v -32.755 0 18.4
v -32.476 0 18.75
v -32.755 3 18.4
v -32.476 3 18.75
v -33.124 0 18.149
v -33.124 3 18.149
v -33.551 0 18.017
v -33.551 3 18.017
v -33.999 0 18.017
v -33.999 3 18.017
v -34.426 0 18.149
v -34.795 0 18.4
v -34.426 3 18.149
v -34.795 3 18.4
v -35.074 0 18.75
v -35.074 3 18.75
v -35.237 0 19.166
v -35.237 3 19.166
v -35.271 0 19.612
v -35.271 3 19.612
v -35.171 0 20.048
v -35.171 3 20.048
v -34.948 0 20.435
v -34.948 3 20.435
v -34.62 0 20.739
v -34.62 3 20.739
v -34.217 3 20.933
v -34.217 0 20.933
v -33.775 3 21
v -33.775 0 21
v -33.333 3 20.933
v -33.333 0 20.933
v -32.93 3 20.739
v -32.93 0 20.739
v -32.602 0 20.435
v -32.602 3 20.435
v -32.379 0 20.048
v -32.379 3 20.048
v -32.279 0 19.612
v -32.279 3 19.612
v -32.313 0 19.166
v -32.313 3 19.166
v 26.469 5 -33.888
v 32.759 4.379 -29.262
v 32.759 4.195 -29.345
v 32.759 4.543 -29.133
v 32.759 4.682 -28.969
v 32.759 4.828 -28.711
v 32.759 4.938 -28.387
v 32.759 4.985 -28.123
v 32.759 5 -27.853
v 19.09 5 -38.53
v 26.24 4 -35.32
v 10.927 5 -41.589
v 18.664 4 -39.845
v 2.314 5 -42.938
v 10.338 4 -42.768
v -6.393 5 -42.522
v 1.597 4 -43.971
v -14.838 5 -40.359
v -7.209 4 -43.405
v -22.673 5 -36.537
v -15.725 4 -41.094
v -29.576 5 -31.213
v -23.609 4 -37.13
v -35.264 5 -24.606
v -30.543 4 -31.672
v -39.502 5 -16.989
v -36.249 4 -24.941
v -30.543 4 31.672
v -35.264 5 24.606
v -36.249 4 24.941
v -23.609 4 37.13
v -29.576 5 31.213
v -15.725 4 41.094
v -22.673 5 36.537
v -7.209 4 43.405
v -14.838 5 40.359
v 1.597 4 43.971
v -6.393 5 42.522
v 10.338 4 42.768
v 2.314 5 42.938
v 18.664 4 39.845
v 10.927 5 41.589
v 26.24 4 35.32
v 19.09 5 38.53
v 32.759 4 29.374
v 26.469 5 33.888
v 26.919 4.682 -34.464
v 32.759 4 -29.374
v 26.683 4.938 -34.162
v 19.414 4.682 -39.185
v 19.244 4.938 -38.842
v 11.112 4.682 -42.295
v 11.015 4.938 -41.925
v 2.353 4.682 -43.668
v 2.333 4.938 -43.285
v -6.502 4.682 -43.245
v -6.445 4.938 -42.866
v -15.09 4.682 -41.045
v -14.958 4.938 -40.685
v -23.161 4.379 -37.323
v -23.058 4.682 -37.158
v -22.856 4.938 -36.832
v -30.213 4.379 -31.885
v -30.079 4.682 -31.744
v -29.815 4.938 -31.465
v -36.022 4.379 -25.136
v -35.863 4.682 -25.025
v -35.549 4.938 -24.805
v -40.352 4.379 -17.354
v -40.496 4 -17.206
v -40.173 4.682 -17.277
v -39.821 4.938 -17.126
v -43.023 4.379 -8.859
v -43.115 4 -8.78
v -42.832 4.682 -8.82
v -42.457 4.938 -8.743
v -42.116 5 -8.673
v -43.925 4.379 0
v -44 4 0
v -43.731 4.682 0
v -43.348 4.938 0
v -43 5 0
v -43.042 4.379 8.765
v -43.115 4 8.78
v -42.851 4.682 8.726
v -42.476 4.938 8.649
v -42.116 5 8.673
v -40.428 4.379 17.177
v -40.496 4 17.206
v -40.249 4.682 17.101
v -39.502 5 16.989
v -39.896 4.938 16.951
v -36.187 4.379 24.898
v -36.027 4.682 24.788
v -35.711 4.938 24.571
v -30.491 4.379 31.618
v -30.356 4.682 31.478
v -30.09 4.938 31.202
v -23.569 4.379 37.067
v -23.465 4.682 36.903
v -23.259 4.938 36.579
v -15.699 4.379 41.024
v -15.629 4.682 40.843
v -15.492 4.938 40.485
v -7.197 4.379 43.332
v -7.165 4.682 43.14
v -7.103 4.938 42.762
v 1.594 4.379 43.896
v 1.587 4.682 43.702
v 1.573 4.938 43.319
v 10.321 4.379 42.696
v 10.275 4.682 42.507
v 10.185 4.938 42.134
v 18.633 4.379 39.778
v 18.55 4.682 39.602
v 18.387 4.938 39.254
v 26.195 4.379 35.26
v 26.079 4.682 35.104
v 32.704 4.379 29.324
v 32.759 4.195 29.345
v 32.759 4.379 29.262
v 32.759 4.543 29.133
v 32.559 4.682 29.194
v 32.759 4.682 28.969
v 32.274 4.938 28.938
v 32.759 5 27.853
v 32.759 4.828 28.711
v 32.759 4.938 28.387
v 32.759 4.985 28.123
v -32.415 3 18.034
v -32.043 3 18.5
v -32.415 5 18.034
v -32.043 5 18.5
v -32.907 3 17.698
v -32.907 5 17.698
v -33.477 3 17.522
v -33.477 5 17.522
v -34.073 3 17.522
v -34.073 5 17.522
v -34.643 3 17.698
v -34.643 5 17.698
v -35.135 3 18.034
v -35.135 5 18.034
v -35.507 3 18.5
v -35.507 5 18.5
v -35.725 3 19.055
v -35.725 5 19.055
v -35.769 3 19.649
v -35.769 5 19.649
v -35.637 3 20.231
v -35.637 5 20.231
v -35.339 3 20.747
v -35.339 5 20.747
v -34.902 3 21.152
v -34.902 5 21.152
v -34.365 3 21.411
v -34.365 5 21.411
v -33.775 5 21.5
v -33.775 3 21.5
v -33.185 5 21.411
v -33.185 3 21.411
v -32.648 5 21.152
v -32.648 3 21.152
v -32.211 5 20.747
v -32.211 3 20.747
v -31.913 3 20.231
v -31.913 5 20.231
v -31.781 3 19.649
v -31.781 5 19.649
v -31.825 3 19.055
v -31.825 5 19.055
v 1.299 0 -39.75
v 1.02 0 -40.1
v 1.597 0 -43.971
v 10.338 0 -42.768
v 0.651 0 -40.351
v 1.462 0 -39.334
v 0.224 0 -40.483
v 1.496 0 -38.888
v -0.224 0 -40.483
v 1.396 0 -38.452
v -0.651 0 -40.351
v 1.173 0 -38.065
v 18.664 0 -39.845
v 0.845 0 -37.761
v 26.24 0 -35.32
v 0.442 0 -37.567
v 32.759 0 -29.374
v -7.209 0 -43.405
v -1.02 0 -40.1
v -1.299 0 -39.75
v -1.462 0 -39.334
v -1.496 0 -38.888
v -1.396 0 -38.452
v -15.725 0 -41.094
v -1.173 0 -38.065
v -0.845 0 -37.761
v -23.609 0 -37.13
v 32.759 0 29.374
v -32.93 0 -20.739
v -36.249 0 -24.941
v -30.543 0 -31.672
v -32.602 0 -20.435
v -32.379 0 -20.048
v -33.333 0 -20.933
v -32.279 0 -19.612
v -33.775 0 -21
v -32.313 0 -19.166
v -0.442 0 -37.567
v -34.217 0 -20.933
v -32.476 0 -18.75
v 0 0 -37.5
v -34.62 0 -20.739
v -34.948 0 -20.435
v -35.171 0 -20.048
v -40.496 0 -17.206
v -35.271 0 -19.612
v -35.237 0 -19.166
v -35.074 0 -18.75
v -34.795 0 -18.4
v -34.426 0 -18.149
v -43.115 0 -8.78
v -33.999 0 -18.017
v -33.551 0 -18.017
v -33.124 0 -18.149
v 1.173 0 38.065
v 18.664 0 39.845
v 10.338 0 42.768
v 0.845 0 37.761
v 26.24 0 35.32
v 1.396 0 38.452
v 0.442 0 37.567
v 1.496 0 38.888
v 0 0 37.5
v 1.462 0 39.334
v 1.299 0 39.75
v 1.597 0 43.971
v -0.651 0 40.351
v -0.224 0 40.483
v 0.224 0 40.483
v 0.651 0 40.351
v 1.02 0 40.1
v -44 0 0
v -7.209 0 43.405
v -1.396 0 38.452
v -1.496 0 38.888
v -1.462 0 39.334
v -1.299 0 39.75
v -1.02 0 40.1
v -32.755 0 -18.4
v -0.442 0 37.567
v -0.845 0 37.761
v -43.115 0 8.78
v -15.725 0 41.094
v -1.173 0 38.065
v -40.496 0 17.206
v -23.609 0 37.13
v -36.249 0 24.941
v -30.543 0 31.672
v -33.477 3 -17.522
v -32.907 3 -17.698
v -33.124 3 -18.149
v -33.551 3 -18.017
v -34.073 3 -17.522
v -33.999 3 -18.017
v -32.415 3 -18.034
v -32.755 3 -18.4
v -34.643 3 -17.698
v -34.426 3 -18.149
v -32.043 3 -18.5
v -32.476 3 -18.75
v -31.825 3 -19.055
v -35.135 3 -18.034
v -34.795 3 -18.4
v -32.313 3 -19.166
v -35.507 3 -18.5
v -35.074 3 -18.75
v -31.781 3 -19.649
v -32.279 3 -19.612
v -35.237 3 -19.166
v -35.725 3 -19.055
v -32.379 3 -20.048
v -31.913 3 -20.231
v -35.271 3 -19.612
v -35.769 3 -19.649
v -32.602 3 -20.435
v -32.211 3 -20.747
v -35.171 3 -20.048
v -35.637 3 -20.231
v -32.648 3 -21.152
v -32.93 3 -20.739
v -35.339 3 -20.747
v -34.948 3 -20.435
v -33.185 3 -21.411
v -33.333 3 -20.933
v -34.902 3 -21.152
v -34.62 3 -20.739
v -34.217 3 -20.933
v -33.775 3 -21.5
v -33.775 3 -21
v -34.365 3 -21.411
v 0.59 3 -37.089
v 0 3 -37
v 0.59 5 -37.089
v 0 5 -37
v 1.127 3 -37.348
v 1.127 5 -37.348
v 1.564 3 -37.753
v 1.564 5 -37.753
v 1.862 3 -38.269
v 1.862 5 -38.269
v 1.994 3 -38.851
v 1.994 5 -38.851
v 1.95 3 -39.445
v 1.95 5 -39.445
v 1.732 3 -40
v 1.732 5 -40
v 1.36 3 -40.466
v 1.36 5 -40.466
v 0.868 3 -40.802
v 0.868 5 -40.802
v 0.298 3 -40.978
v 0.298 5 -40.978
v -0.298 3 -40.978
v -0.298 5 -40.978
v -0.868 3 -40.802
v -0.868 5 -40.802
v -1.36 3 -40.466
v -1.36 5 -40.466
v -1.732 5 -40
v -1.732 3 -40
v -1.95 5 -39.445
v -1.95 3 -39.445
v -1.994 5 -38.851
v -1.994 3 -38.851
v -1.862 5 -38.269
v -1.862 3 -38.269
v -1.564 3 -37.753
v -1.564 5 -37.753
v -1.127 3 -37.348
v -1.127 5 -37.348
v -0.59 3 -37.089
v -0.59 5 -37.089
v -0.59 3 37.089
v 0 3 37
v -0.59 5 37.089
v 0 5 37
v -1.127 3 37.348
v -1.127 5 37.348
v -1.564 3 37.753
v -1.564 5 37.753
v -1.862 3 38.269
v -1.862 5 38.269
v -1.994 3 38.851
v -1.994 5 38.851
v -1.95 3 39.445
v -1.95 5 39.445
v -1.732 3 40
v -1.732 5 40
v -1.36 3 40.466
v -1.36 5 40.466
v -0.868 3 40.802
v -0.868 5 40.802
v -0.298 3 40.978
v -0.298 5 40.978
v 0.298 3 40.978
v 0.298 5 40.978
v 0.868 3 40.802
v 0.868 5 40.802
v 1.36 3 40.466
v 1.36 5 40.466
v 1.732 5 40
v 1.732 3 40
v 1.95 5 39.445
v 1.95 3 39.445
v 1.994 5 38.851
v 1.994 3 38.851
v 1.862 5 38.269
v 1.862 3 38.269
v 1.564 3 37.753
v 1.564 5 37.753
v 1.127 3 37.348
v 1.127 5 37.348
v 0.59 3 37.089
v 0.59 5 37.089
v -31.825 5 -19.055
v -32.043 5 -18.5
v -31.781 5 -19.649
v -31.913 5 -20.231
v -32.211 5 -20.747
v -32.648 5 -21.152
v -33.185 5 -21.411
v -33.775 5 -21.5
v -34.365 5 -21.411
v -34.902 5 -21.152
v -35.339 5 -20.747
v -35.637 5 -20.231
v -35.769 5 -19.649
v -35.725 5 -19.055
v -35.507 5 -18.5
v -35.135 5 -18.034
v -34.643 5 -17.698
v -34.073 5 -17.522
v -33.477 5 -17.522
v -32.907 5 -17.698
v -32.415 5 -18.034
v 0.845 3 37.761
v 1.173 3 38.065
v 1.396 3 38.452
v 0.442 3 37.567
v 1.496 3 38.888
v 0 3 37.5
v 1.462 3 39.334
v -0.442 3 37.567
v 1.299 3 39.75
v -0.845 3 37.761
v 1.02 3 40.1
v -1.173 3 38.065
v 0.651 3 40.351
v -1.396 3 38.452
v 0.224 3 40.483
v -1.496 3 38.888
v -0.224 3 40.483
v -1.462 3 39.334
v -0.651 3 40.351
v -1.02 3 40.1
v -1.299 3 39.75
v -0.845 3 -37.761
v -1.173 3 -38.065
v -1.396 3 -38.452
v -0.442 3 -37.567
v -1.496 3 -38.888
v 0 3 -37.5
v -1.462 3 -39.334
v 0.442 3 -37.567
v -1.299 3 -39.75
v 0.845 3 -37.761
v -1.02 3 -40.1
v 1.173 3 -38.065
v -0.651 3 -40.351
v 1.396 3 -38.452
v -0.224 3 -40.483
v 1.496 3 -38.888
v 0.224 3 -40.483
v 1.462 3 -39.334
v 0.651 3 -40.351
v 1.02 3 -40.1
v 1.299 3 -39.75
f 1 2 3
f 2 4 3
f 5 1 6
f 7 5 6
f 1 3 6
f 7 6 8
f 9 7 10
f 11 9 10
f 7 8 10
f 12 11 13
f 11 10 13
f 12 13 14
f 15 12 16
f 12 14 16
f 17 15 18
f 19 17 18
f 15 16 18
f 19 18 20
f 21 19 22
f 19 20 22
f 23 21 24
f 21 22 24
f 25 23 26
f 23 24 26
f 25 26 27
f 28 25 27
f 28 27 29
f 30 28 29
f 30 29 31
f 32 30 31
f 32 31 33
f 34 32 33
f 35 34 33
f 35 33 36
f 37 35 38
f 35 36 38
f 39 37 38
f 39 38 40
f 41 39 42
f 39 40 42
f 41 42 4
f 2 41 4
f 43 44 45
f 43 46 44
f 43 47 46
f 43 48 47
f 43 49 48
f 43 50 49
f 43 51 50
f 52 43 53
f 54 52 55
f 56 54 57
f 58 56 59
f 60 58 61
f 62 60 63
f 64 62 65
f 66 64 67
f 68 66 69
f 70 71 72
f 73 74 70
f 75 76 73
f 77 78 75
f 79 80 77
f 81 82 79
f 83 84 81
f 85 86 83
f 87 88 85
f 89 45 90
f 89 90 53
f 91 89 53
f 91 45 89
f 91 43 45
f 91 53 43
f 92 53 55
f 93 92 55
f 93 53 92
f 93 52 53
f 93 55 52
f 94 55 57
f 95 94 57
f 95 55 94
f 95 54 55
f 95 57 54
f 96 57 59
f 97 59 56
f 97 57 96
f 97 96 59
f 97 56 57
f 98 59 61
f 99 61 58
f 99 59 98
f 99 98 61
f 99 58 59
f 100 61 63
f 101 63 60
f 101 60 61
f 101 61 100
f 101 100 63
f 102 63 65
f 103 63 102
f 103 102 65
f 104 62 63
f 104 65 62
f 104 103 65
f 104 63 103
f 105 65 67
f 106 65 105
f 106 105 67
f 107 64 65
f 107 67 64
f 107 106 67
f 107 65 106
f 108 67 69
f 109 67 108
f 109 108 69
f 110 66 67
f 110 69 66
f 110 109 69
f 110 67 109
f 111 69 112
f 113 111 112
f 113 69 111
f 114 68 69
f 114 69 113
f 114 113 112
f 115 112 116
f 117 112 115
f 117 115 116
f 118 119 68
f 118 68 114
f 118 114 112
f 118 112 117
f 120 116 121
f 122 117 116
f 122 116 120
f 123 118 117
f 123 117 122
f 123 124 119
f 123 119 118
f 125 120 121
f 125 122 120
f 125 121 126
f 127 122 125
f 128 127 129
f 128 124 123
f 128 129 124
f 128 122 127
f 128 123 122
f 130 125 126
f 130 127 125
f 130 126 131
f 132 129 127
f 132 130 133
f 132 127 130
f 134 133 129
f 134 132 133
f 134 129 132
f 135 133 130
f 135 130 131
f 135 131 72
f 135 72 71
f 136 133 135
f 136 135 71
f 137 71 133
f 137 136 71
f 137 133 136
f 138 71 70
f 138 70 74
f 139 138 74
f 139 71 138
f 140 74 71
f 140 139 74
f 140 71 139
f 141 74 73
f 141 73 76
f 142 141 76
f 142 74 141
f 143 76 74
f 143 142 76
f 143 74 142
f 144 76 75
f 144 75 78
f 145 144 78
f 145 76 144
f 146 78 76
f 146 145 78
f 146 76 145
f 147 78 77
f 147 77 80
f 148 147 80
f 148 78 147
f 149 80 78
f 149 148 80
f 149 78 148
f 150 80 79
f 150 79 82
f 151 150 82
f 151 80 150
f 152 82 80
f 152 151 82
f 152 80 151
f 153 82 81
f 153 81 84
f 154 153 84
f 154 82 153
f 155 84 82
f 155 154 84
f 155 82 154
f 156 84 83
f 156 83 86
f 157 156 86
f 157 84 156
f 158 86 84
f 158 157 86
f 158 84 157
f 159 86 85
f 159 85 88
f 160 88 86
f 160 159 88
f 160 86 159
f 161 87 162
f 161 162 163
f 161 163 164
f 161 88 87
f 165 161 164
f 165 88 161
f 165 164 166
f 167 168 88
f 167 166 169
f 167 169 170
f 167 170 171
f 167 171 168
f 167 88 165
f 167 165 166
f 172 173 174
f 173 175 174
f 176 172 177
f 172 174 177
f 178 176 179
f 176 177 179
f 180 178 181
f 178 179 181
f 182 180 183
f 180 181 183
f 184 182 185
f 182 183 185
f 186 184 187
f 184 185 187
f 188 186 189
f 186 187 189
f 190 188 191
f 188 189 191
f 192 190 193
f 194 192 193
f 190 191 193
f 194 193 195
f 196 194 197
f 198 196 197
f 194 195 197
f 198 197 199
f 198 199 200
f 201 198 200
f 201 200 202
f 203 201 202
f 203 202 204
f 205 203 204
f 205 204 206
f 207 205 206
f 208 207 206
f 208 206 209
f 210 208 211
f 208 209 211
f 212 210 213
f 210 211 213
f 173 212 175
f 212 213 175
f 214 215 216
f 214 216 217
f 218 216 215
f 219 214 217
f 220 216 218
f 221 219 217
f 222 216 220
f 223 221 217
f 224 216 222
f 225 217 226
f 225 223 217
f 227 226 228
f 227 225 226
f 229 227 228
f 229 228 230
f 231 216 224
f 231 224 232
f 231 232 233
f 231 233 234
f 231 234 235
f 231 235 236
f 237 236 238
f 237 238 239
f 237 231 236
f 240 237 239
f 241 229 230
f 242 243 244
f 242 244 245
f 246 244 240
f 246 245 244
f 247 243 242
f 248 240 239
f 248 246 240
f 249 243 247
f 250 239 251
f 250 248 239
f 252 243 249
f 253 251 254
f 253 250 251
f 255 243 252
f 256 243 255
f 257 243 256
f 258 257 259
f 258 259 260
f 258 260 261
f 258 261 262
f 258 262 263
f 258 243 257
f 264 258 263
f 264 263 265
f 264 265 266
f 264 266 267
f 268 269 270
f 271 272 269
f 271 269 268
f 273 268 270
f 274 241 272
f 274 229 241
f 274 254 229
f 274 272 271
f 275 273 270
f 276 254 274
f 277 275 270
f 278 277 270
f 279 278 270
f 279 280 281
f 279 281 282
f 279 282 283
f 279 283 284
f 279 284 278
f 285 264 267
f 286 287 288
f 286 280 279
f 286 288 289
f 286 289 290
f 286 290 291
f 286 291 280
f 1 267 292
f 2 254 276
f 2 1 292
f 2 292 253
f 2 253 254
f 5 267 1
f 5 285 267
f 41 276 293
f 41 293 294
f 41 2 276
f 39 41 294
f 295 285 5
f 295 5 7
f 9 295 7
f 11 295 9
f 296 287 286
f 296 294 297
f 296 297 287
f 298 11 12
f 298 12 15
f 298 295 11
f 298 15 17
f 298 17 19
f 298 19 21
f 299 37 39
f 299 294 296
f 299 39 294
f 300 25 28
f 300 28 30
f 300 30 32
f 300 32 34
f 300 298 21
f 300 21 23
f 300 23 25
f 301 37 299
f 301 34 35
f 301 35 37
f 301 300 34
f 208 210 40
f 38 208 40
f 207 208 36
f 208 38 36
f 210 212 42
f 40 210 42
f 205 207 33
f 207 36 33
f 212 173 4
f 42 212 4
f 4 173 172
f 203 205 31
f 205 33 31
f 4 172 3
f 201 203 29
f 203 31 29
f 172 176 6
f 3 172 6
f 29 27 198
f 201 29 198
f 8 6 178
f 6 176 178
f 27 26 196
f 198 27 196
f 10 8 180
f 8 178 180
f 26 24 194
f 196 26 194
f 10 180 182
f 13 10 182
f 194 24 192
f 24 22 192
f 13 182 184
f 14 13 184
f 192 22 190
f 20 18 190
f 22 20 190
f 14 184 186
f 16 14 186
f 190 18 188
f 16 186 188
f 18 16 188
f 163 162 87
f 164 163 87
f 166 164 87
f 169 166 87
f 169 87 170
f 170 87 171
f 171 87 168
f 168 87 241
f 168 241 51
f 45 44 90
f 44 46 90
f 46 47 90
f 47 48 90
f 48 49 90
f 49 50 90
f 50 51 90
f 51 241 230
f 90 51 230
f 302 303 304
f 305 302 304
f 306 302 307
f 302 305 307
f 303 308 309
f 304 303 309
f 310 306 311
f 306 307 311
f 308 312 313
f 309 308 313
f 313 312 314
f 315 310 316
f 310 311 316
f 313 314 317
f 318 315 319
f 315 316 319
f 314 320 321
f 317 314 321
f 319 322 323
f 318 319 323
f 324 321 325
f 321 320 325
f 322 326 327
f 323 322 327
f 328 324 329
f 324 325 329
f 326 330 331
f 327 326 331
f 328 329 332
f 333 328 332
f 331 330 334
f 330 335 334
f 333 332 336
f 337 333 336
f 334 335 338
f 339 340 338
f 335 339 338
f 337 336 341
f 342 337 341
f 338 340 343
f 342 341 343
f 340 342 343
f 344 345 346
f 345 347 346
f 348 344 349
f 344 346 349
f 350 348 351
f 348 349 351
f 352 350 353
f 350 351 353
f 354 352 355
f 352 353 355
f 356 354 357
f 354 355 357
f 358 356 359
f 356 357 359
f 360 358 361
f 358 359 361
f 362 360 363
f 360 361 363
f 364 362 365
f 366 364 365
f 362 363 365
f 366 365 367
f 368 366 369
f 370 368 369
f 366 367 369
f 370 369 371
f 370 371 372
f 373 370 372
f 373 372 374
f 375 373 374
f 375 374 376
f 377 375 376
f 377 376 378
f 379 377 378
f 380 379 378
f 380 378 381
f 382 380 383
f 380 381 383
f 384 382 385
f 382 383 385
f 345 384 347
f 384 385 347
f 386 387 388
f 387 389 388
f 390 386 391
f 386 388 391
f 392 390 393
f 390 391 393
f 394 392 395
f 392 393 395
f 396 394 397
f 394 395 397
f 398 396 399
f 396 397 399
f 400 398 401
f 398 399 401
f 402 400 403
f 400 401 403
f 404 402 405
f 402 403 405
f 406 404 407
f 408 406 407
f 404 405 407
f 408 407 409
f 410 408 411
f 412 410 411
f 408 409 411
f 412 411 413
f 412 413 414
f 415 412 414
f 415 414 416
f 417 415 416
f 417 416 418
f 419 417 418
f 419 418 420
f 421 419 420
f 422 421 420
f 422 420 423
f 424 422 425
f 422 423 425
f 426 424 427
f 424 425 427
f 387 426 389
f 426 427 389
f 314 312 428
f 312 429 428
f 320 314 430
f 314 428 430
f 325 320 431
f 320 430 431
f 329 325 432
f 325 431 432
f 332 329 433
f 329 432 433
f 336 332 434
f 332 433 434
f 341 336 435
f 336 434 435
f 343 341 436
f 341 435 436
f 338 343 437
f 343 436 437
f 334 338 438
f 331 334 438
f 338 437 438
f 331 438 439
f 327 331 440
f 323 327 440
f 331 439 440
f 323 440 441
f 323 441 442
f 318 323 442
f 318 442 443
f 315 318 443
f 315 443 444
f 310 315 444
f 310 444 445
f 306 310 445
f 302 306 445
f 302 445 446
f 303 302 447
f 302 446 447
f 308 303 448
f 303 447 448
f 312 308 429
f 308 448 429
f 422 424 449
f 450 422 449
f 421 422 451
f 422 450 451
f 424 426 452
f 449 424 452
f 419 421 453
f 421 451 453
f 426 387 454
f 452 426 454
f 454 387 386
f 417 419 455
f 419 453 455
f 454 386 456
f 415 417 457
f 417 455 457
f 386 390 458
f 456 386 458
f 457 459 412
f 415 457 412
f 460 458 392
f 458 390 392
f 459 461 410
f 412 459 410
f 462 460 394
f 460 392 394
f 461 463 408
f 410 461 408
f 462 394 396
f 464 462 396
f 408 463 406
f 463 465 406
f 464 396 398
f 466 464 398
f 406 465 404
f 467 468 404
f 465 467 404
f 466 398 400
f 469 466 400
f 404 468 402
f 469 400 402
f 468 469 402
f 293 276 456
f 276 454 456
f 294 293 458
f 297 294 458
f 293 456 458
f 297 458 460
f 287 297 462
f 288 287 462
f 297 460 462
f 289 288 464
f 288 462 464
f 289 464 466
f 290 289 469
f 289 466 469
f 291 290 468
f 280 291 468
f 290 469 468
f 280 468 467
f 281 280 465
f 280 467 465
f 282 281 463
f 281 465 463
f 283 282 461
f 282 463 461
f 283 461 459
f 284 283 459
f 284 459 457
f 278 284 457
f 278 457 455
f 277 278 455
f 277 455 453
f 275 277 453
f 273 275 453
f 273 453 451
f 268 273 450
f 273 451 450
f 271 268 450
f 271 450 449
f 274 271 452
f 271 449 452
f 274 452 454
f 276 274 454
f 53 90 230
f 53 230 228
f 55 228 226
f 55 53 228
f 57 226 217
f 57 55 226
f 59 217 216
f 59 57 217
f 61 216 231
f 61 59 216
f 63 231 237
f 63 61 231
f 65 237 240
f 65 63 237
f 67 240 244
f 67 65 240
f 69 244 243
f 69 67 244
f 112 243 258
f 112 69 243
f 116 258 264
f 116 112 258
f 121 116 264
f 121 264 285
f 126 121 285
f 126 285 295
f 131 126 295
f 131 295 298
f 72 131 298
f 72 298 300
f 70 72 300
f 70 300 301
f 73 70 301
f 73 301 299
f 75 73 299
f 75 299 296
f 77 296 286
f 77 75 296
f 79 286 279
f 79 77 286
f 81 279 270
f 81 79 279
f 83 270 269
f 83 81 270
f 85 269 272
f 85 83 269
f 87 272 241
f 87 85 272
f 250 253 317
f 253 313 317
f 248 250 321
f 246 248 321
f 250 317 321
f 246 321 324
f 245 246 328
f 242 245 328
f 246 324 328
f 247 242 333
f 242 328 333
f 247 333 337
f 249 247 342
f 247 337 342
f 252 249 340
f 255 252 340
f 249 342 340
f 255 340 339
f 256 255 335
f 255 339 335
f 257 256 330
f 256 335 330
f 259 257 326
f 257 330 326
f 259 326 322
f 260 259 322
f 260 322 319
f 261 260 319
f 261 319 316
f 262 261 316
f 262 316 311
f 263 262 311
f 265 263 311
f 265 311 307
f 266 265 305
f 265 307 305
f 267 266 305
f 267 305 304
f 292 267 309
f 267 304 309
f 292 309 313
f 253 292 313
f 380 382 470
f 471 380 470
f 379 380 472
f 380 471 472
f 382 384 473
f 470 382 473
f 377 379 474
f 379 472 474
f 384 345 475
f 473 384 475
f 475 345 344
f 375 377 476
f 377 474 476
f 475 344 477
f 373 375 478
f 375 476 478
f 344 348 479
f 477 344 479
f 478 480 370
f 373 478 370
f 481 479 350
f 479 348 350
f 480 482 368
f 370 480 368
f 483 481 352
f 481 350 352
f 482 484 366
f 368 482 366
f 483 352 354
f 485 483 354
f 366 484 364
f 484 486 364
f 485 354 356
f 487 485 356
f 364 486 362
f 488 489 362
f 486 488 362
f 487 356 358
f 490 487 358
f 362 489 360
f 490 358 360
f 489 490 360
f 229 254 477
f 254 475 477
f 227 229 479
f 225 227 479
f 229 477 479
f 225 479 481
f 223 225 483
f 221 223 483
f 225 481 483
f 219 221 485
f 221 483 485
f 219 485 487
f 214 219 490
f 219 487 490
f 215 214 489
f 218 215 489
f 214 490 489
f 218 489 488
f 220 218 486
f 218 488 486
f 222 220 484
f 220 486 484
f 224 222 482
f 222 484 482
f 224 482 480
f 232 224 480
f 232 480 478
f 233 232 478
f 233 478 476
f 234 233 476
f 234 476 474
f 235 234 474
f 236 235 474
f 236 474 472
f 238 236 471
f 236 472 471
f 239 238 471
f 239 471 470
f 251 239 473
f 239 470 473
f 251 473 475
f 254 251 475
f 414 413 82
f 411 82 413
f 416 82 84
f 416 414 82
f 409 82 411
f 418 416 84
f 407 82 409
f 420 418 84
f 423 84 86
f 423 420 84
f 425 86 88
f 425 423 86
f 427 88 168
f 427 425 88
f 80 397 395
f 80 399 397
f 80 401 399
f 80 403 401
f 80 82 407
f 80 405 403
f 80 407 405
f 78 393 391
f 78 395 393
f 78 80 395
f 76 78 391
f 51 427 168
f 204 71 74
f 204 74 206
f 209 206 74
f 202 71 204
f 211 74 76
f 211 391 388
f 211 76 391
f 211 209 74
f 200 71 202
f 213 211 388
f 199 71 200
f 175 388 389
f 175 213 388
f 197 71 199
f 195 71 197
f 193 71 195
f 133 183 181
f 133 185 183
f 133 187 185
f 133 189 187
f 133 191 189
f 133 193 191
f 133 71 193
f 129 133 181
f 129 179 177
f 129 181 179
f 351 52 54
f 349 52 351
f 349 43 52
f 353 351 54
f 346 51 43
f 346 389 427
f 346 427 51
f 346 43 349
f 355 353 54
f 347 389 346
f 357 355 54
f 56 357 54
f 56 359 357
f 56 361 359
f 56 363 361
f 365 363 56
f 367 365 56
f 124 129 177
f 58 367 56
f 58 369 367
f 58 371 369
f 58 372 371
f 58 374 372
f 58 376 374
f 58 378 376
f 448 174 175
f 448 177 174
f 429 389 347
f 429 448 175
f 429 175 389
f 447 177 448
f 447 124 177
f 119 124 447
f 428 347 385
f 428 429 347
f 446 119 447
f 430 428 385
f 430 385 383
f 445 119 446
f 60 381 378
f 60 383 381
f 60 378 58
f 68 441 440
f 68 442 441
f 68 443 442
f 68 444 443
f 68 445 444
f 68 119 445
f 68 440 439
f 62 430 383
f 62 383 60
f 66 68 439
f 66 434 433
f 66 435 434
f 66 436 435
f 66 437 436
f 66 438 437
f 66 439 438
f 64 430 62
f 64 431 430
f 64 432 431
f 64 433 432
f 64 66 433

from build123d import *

# Parameters (mm, degrees)
PATTERN_CIRCULAR_1_COUNT = 4
PATTERN_CIRCULAR_1_ANGLE = 180
CUT_EXTRUDE_1_DEPTH      = 63.425956281


with BuildPart() as part:
    # Эскиз1 → Повернуть1 (revolve)
    with BuildSketch(Plane(origin=(0, 0, 0), x_dir=(0, 0, -1), z_dir=(1, 0, 0))):
        with BuildLine():
            Line((0, 0), (44, 0))
            Line((44, 0), (44, 4))
            ThreePointArc((44, 4), (43.707106781, 4.707106781), (43, 5))
            Line((43, 5), (0, 5))
            Line((0, 5), (0, 0))
        make_face()
    revolve(axis=Axis((0, 0, 0), (0, 1, 0)))

    # Эскиз2 → Вырез-Повернуть1 (revolve, cut)
    with BuildSketch(Plane(origin=(0, 0, 0), x_dir=(0, 0, -1), z_dir=(1, 0, 0))):
        Polygon((-39, 0), (-37.5, 0), (-37.5, 3), (-37, 3), (-37, 5), (-39, 5), align=None)
    cut_revolve_1 = revolve(axis=Axis((0, 0, 39), (0, 1, 0)), mode=Mode.SUBTRACT)

    # Круговой массив1: Вырез-Повернуть1 ×4 about axis
    pattern_circular_1_axis = Axis((0, 0, 0), (0, -1, 0))
    for i in range(1, PATTERN_CIRCULAR_1_COUNT):
        add(cut_revolve_1.rotate(pattern_circular_1_axis, i * PATTERN_CIRCULAR_1_ANGLE / (PATTERN_CIRCULAR_1_COUNT - 1)), mode=Mode.SUBTRACT)

    # Эскиз3 → Вырез-Вытянуть1 (cut, through all)
    with BuildSketch(Plane.XZ):
        with BuildLine():
            Line((32.759496508, 29.373719352), (32.759496508, -29.373719352))
            ThreePointArc((32.759496508, -29.373719352), (44, 0), (32.759496508, 29.373719352))
        make_face()
    extrude(amount=-CUT_EXTRUDE_1_DEPTH, mode=Mode.SUBTRACT)


solid = part.part
